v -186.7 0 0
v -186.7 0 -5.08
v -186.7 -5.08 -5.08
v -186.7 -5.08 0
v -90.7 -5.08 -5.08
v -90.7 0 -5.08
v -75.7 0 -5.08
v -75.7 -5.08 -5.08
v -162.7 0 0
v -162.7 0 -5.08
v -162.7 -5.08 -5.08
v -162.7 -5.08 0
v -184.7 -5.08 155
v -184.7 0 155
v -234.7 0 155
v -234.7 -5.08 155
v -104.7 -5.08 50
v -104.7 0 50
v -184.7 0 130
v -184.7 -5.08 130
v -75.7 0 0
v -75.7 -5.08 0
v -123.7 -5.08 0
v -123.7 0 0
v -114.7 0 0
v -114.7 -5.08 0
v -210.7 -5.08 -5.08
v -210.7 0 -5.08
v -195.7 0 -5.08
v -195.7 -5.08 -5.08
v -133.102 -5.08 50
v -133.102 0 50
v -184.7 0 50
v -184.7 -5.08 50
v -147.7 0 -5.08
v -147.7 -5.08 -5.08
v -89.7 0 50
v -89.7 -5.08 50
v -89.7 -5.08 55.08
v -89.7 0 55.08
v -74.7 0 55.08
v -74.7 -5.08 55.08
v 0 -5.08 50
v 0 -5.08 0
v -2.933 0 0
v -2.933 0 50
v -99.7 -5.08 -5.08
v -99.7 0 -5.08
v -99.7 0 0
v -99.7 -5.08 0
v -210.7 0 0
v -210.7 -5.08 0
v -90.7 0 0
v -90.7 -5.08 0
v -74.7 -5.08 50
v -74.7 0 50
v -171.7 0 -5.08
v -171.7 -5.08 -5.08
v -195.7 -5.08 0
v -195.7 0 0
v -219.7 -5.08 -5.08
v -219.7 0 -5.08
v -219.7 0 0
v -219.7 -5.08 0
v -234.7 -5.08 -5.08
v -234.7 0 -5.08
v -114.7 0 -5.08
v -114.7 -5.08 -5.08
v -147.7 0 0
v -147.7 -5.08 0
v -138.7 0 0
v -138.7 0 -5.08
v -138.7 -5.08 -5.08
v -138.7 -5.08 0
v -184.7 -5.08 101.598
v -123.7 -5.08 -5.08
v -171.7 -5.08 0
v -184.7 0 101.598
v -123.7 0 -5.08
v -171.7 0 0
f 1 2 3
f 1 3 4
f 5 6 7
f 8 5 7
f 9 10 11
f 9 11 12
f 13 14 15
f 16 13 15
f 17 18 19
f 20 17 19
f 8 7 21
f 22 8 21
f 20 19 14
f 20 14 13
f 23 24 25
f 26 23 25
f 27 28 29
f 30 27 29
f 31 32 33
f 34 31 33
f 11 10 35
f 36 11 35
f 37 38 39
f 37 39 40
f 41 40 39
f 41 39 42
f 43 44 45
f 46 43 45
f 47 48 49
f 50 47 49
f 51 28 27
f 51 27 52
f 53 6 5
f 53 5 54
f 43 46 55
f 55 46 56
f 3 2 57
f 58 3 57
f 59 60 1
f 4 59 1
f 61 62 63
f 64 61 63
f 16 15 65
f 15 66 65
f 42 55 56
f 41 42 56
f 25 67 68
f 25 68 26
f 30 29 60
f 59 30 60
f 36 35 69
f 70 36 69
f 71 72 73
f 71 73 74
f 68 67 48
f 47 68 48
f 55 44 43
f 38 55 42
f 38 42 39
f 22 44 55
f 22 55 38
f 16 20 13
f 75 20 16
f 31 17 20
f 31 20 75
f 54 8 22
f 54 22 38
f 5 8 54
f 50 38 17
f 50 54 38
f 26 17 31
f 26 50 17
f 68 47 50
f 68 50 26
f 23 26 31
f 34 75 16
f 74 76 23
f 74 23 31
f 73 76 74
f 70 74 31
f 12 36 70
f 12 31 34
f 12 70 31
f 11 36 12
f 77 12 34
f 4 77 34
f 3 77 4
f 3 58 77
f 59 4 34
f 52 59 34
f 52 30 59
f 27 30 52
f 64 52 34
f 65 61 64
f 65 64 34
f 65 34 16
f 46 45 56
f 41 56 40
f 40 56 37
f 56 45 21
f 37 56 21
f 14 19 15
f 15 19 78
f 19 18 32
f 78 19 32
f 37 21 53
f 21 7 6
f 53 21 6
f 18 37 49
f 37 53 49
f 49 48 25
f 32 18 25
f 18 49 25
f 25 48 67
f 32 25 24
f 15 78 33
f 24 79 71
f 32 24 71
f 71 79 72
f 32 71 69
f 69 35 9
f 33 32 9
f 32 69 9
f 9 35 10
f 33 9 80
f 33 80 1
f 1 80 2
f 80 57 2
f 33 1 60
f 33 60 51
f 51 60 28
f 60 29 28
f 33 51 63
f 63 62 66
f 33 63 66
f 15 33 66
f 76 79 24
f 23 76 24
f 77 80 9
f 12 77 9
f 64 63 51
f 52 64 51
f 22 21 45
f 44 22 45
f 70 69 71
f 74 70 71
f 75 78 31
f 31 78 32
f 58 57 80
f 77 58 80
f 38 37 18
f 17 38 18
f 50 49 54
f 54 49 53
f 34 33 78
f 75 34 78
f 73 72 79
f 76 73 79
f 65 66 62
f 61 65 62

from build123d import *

# Parameters (mm, degrees)
F0_W     = 15
F0_H     = 5.08
F1_DEPTH = 5.08
F2_DEPTH = 25
F4_DEPTH = 50
F5_W     = 15
F5_H     = 5.08
F6_DEPTH = 5.08


# Not quite as in the source:
# - a feature names something its author has since deleted; it is built from what else it names


with BuildPart() as f1:
    # F0 (on Front) → F1 (new body)
    with BuildSketch(Plane.XZ):
        Polygon((-75.7, 0), (0, 0), (0, 50), (-104.7, 50), (-133.1023774395, 50), (-184.7, 50), (-184.7, 101.5976225605), (-184.7, 130), (-234.7, 130), (-234.7, 0), (-219.7, 0), (-210.7, 0), (-195.7, 0), (-186.7, 0), (-171.7, 0), (-162.7, 0), (-147.7, 0), (-138.7, 0), (-123.7, 0), (-114.7, 0), (-99.7, 0), (-90.7, 0), align=None)
        with Locations((-83.2, -2.54)):
            Rectangle(F0_W, F0_H)
        Polygon((-133.1023774395, 50), (-104.7, 50), (-184.7, 130), (-184.7, 101.5976225605), align=None)
        with Locations((-107.2, -2.54)):
            Rectangle(F0_W, F0_H)
        with Locations((-131.2, -2.54)):
            Rectangle(F0_W, F0_H)
        with Locations((-227.2, -2.54)):
            Rectangle(F0_W, F0_H)
        with Locations((-155.2, -2.54)):
            Rectangle(F0_W, F0_H)
        with Locations((-203.2, -2.54)):
            Rectangle(F0_W, F0_H)
        with Locations((-179.2, -2.54)):
            Rectangle(F0_W, F0_H)
    extrude(amount=F1_DEPTH)

    # F2 (add): a face of the model
    f2_faces = [f1.faces().sort_by_distance(p)[0] for p in [
        (-209.7, -2.54, 130),
    ]]
    extrude(f2_faces, amount=F2_DEPTH)

    # F3 (on face) → F4 (cut)
    with BuildSketch(Plane(origin=(0, 0, 0), x_dir=(1, 0, 0), z_dir=(0, 0, -1))):
        Polygon((0, 0), (0, 5.08), (-2.9329393675, 0), align=None)
    extrude(amount=-F4_DEPTH, mode=Mode.SUBTRACT)

    # F5 (on face) → F6 (join)
    with BuildSketch(Plane.XY.offset(50)):
        with Locations((-82.2, -2.54)):
            Rectangle(F5_W, F5_H)
    extrude(amount=F6_DEPTH)


solid = f1.part
